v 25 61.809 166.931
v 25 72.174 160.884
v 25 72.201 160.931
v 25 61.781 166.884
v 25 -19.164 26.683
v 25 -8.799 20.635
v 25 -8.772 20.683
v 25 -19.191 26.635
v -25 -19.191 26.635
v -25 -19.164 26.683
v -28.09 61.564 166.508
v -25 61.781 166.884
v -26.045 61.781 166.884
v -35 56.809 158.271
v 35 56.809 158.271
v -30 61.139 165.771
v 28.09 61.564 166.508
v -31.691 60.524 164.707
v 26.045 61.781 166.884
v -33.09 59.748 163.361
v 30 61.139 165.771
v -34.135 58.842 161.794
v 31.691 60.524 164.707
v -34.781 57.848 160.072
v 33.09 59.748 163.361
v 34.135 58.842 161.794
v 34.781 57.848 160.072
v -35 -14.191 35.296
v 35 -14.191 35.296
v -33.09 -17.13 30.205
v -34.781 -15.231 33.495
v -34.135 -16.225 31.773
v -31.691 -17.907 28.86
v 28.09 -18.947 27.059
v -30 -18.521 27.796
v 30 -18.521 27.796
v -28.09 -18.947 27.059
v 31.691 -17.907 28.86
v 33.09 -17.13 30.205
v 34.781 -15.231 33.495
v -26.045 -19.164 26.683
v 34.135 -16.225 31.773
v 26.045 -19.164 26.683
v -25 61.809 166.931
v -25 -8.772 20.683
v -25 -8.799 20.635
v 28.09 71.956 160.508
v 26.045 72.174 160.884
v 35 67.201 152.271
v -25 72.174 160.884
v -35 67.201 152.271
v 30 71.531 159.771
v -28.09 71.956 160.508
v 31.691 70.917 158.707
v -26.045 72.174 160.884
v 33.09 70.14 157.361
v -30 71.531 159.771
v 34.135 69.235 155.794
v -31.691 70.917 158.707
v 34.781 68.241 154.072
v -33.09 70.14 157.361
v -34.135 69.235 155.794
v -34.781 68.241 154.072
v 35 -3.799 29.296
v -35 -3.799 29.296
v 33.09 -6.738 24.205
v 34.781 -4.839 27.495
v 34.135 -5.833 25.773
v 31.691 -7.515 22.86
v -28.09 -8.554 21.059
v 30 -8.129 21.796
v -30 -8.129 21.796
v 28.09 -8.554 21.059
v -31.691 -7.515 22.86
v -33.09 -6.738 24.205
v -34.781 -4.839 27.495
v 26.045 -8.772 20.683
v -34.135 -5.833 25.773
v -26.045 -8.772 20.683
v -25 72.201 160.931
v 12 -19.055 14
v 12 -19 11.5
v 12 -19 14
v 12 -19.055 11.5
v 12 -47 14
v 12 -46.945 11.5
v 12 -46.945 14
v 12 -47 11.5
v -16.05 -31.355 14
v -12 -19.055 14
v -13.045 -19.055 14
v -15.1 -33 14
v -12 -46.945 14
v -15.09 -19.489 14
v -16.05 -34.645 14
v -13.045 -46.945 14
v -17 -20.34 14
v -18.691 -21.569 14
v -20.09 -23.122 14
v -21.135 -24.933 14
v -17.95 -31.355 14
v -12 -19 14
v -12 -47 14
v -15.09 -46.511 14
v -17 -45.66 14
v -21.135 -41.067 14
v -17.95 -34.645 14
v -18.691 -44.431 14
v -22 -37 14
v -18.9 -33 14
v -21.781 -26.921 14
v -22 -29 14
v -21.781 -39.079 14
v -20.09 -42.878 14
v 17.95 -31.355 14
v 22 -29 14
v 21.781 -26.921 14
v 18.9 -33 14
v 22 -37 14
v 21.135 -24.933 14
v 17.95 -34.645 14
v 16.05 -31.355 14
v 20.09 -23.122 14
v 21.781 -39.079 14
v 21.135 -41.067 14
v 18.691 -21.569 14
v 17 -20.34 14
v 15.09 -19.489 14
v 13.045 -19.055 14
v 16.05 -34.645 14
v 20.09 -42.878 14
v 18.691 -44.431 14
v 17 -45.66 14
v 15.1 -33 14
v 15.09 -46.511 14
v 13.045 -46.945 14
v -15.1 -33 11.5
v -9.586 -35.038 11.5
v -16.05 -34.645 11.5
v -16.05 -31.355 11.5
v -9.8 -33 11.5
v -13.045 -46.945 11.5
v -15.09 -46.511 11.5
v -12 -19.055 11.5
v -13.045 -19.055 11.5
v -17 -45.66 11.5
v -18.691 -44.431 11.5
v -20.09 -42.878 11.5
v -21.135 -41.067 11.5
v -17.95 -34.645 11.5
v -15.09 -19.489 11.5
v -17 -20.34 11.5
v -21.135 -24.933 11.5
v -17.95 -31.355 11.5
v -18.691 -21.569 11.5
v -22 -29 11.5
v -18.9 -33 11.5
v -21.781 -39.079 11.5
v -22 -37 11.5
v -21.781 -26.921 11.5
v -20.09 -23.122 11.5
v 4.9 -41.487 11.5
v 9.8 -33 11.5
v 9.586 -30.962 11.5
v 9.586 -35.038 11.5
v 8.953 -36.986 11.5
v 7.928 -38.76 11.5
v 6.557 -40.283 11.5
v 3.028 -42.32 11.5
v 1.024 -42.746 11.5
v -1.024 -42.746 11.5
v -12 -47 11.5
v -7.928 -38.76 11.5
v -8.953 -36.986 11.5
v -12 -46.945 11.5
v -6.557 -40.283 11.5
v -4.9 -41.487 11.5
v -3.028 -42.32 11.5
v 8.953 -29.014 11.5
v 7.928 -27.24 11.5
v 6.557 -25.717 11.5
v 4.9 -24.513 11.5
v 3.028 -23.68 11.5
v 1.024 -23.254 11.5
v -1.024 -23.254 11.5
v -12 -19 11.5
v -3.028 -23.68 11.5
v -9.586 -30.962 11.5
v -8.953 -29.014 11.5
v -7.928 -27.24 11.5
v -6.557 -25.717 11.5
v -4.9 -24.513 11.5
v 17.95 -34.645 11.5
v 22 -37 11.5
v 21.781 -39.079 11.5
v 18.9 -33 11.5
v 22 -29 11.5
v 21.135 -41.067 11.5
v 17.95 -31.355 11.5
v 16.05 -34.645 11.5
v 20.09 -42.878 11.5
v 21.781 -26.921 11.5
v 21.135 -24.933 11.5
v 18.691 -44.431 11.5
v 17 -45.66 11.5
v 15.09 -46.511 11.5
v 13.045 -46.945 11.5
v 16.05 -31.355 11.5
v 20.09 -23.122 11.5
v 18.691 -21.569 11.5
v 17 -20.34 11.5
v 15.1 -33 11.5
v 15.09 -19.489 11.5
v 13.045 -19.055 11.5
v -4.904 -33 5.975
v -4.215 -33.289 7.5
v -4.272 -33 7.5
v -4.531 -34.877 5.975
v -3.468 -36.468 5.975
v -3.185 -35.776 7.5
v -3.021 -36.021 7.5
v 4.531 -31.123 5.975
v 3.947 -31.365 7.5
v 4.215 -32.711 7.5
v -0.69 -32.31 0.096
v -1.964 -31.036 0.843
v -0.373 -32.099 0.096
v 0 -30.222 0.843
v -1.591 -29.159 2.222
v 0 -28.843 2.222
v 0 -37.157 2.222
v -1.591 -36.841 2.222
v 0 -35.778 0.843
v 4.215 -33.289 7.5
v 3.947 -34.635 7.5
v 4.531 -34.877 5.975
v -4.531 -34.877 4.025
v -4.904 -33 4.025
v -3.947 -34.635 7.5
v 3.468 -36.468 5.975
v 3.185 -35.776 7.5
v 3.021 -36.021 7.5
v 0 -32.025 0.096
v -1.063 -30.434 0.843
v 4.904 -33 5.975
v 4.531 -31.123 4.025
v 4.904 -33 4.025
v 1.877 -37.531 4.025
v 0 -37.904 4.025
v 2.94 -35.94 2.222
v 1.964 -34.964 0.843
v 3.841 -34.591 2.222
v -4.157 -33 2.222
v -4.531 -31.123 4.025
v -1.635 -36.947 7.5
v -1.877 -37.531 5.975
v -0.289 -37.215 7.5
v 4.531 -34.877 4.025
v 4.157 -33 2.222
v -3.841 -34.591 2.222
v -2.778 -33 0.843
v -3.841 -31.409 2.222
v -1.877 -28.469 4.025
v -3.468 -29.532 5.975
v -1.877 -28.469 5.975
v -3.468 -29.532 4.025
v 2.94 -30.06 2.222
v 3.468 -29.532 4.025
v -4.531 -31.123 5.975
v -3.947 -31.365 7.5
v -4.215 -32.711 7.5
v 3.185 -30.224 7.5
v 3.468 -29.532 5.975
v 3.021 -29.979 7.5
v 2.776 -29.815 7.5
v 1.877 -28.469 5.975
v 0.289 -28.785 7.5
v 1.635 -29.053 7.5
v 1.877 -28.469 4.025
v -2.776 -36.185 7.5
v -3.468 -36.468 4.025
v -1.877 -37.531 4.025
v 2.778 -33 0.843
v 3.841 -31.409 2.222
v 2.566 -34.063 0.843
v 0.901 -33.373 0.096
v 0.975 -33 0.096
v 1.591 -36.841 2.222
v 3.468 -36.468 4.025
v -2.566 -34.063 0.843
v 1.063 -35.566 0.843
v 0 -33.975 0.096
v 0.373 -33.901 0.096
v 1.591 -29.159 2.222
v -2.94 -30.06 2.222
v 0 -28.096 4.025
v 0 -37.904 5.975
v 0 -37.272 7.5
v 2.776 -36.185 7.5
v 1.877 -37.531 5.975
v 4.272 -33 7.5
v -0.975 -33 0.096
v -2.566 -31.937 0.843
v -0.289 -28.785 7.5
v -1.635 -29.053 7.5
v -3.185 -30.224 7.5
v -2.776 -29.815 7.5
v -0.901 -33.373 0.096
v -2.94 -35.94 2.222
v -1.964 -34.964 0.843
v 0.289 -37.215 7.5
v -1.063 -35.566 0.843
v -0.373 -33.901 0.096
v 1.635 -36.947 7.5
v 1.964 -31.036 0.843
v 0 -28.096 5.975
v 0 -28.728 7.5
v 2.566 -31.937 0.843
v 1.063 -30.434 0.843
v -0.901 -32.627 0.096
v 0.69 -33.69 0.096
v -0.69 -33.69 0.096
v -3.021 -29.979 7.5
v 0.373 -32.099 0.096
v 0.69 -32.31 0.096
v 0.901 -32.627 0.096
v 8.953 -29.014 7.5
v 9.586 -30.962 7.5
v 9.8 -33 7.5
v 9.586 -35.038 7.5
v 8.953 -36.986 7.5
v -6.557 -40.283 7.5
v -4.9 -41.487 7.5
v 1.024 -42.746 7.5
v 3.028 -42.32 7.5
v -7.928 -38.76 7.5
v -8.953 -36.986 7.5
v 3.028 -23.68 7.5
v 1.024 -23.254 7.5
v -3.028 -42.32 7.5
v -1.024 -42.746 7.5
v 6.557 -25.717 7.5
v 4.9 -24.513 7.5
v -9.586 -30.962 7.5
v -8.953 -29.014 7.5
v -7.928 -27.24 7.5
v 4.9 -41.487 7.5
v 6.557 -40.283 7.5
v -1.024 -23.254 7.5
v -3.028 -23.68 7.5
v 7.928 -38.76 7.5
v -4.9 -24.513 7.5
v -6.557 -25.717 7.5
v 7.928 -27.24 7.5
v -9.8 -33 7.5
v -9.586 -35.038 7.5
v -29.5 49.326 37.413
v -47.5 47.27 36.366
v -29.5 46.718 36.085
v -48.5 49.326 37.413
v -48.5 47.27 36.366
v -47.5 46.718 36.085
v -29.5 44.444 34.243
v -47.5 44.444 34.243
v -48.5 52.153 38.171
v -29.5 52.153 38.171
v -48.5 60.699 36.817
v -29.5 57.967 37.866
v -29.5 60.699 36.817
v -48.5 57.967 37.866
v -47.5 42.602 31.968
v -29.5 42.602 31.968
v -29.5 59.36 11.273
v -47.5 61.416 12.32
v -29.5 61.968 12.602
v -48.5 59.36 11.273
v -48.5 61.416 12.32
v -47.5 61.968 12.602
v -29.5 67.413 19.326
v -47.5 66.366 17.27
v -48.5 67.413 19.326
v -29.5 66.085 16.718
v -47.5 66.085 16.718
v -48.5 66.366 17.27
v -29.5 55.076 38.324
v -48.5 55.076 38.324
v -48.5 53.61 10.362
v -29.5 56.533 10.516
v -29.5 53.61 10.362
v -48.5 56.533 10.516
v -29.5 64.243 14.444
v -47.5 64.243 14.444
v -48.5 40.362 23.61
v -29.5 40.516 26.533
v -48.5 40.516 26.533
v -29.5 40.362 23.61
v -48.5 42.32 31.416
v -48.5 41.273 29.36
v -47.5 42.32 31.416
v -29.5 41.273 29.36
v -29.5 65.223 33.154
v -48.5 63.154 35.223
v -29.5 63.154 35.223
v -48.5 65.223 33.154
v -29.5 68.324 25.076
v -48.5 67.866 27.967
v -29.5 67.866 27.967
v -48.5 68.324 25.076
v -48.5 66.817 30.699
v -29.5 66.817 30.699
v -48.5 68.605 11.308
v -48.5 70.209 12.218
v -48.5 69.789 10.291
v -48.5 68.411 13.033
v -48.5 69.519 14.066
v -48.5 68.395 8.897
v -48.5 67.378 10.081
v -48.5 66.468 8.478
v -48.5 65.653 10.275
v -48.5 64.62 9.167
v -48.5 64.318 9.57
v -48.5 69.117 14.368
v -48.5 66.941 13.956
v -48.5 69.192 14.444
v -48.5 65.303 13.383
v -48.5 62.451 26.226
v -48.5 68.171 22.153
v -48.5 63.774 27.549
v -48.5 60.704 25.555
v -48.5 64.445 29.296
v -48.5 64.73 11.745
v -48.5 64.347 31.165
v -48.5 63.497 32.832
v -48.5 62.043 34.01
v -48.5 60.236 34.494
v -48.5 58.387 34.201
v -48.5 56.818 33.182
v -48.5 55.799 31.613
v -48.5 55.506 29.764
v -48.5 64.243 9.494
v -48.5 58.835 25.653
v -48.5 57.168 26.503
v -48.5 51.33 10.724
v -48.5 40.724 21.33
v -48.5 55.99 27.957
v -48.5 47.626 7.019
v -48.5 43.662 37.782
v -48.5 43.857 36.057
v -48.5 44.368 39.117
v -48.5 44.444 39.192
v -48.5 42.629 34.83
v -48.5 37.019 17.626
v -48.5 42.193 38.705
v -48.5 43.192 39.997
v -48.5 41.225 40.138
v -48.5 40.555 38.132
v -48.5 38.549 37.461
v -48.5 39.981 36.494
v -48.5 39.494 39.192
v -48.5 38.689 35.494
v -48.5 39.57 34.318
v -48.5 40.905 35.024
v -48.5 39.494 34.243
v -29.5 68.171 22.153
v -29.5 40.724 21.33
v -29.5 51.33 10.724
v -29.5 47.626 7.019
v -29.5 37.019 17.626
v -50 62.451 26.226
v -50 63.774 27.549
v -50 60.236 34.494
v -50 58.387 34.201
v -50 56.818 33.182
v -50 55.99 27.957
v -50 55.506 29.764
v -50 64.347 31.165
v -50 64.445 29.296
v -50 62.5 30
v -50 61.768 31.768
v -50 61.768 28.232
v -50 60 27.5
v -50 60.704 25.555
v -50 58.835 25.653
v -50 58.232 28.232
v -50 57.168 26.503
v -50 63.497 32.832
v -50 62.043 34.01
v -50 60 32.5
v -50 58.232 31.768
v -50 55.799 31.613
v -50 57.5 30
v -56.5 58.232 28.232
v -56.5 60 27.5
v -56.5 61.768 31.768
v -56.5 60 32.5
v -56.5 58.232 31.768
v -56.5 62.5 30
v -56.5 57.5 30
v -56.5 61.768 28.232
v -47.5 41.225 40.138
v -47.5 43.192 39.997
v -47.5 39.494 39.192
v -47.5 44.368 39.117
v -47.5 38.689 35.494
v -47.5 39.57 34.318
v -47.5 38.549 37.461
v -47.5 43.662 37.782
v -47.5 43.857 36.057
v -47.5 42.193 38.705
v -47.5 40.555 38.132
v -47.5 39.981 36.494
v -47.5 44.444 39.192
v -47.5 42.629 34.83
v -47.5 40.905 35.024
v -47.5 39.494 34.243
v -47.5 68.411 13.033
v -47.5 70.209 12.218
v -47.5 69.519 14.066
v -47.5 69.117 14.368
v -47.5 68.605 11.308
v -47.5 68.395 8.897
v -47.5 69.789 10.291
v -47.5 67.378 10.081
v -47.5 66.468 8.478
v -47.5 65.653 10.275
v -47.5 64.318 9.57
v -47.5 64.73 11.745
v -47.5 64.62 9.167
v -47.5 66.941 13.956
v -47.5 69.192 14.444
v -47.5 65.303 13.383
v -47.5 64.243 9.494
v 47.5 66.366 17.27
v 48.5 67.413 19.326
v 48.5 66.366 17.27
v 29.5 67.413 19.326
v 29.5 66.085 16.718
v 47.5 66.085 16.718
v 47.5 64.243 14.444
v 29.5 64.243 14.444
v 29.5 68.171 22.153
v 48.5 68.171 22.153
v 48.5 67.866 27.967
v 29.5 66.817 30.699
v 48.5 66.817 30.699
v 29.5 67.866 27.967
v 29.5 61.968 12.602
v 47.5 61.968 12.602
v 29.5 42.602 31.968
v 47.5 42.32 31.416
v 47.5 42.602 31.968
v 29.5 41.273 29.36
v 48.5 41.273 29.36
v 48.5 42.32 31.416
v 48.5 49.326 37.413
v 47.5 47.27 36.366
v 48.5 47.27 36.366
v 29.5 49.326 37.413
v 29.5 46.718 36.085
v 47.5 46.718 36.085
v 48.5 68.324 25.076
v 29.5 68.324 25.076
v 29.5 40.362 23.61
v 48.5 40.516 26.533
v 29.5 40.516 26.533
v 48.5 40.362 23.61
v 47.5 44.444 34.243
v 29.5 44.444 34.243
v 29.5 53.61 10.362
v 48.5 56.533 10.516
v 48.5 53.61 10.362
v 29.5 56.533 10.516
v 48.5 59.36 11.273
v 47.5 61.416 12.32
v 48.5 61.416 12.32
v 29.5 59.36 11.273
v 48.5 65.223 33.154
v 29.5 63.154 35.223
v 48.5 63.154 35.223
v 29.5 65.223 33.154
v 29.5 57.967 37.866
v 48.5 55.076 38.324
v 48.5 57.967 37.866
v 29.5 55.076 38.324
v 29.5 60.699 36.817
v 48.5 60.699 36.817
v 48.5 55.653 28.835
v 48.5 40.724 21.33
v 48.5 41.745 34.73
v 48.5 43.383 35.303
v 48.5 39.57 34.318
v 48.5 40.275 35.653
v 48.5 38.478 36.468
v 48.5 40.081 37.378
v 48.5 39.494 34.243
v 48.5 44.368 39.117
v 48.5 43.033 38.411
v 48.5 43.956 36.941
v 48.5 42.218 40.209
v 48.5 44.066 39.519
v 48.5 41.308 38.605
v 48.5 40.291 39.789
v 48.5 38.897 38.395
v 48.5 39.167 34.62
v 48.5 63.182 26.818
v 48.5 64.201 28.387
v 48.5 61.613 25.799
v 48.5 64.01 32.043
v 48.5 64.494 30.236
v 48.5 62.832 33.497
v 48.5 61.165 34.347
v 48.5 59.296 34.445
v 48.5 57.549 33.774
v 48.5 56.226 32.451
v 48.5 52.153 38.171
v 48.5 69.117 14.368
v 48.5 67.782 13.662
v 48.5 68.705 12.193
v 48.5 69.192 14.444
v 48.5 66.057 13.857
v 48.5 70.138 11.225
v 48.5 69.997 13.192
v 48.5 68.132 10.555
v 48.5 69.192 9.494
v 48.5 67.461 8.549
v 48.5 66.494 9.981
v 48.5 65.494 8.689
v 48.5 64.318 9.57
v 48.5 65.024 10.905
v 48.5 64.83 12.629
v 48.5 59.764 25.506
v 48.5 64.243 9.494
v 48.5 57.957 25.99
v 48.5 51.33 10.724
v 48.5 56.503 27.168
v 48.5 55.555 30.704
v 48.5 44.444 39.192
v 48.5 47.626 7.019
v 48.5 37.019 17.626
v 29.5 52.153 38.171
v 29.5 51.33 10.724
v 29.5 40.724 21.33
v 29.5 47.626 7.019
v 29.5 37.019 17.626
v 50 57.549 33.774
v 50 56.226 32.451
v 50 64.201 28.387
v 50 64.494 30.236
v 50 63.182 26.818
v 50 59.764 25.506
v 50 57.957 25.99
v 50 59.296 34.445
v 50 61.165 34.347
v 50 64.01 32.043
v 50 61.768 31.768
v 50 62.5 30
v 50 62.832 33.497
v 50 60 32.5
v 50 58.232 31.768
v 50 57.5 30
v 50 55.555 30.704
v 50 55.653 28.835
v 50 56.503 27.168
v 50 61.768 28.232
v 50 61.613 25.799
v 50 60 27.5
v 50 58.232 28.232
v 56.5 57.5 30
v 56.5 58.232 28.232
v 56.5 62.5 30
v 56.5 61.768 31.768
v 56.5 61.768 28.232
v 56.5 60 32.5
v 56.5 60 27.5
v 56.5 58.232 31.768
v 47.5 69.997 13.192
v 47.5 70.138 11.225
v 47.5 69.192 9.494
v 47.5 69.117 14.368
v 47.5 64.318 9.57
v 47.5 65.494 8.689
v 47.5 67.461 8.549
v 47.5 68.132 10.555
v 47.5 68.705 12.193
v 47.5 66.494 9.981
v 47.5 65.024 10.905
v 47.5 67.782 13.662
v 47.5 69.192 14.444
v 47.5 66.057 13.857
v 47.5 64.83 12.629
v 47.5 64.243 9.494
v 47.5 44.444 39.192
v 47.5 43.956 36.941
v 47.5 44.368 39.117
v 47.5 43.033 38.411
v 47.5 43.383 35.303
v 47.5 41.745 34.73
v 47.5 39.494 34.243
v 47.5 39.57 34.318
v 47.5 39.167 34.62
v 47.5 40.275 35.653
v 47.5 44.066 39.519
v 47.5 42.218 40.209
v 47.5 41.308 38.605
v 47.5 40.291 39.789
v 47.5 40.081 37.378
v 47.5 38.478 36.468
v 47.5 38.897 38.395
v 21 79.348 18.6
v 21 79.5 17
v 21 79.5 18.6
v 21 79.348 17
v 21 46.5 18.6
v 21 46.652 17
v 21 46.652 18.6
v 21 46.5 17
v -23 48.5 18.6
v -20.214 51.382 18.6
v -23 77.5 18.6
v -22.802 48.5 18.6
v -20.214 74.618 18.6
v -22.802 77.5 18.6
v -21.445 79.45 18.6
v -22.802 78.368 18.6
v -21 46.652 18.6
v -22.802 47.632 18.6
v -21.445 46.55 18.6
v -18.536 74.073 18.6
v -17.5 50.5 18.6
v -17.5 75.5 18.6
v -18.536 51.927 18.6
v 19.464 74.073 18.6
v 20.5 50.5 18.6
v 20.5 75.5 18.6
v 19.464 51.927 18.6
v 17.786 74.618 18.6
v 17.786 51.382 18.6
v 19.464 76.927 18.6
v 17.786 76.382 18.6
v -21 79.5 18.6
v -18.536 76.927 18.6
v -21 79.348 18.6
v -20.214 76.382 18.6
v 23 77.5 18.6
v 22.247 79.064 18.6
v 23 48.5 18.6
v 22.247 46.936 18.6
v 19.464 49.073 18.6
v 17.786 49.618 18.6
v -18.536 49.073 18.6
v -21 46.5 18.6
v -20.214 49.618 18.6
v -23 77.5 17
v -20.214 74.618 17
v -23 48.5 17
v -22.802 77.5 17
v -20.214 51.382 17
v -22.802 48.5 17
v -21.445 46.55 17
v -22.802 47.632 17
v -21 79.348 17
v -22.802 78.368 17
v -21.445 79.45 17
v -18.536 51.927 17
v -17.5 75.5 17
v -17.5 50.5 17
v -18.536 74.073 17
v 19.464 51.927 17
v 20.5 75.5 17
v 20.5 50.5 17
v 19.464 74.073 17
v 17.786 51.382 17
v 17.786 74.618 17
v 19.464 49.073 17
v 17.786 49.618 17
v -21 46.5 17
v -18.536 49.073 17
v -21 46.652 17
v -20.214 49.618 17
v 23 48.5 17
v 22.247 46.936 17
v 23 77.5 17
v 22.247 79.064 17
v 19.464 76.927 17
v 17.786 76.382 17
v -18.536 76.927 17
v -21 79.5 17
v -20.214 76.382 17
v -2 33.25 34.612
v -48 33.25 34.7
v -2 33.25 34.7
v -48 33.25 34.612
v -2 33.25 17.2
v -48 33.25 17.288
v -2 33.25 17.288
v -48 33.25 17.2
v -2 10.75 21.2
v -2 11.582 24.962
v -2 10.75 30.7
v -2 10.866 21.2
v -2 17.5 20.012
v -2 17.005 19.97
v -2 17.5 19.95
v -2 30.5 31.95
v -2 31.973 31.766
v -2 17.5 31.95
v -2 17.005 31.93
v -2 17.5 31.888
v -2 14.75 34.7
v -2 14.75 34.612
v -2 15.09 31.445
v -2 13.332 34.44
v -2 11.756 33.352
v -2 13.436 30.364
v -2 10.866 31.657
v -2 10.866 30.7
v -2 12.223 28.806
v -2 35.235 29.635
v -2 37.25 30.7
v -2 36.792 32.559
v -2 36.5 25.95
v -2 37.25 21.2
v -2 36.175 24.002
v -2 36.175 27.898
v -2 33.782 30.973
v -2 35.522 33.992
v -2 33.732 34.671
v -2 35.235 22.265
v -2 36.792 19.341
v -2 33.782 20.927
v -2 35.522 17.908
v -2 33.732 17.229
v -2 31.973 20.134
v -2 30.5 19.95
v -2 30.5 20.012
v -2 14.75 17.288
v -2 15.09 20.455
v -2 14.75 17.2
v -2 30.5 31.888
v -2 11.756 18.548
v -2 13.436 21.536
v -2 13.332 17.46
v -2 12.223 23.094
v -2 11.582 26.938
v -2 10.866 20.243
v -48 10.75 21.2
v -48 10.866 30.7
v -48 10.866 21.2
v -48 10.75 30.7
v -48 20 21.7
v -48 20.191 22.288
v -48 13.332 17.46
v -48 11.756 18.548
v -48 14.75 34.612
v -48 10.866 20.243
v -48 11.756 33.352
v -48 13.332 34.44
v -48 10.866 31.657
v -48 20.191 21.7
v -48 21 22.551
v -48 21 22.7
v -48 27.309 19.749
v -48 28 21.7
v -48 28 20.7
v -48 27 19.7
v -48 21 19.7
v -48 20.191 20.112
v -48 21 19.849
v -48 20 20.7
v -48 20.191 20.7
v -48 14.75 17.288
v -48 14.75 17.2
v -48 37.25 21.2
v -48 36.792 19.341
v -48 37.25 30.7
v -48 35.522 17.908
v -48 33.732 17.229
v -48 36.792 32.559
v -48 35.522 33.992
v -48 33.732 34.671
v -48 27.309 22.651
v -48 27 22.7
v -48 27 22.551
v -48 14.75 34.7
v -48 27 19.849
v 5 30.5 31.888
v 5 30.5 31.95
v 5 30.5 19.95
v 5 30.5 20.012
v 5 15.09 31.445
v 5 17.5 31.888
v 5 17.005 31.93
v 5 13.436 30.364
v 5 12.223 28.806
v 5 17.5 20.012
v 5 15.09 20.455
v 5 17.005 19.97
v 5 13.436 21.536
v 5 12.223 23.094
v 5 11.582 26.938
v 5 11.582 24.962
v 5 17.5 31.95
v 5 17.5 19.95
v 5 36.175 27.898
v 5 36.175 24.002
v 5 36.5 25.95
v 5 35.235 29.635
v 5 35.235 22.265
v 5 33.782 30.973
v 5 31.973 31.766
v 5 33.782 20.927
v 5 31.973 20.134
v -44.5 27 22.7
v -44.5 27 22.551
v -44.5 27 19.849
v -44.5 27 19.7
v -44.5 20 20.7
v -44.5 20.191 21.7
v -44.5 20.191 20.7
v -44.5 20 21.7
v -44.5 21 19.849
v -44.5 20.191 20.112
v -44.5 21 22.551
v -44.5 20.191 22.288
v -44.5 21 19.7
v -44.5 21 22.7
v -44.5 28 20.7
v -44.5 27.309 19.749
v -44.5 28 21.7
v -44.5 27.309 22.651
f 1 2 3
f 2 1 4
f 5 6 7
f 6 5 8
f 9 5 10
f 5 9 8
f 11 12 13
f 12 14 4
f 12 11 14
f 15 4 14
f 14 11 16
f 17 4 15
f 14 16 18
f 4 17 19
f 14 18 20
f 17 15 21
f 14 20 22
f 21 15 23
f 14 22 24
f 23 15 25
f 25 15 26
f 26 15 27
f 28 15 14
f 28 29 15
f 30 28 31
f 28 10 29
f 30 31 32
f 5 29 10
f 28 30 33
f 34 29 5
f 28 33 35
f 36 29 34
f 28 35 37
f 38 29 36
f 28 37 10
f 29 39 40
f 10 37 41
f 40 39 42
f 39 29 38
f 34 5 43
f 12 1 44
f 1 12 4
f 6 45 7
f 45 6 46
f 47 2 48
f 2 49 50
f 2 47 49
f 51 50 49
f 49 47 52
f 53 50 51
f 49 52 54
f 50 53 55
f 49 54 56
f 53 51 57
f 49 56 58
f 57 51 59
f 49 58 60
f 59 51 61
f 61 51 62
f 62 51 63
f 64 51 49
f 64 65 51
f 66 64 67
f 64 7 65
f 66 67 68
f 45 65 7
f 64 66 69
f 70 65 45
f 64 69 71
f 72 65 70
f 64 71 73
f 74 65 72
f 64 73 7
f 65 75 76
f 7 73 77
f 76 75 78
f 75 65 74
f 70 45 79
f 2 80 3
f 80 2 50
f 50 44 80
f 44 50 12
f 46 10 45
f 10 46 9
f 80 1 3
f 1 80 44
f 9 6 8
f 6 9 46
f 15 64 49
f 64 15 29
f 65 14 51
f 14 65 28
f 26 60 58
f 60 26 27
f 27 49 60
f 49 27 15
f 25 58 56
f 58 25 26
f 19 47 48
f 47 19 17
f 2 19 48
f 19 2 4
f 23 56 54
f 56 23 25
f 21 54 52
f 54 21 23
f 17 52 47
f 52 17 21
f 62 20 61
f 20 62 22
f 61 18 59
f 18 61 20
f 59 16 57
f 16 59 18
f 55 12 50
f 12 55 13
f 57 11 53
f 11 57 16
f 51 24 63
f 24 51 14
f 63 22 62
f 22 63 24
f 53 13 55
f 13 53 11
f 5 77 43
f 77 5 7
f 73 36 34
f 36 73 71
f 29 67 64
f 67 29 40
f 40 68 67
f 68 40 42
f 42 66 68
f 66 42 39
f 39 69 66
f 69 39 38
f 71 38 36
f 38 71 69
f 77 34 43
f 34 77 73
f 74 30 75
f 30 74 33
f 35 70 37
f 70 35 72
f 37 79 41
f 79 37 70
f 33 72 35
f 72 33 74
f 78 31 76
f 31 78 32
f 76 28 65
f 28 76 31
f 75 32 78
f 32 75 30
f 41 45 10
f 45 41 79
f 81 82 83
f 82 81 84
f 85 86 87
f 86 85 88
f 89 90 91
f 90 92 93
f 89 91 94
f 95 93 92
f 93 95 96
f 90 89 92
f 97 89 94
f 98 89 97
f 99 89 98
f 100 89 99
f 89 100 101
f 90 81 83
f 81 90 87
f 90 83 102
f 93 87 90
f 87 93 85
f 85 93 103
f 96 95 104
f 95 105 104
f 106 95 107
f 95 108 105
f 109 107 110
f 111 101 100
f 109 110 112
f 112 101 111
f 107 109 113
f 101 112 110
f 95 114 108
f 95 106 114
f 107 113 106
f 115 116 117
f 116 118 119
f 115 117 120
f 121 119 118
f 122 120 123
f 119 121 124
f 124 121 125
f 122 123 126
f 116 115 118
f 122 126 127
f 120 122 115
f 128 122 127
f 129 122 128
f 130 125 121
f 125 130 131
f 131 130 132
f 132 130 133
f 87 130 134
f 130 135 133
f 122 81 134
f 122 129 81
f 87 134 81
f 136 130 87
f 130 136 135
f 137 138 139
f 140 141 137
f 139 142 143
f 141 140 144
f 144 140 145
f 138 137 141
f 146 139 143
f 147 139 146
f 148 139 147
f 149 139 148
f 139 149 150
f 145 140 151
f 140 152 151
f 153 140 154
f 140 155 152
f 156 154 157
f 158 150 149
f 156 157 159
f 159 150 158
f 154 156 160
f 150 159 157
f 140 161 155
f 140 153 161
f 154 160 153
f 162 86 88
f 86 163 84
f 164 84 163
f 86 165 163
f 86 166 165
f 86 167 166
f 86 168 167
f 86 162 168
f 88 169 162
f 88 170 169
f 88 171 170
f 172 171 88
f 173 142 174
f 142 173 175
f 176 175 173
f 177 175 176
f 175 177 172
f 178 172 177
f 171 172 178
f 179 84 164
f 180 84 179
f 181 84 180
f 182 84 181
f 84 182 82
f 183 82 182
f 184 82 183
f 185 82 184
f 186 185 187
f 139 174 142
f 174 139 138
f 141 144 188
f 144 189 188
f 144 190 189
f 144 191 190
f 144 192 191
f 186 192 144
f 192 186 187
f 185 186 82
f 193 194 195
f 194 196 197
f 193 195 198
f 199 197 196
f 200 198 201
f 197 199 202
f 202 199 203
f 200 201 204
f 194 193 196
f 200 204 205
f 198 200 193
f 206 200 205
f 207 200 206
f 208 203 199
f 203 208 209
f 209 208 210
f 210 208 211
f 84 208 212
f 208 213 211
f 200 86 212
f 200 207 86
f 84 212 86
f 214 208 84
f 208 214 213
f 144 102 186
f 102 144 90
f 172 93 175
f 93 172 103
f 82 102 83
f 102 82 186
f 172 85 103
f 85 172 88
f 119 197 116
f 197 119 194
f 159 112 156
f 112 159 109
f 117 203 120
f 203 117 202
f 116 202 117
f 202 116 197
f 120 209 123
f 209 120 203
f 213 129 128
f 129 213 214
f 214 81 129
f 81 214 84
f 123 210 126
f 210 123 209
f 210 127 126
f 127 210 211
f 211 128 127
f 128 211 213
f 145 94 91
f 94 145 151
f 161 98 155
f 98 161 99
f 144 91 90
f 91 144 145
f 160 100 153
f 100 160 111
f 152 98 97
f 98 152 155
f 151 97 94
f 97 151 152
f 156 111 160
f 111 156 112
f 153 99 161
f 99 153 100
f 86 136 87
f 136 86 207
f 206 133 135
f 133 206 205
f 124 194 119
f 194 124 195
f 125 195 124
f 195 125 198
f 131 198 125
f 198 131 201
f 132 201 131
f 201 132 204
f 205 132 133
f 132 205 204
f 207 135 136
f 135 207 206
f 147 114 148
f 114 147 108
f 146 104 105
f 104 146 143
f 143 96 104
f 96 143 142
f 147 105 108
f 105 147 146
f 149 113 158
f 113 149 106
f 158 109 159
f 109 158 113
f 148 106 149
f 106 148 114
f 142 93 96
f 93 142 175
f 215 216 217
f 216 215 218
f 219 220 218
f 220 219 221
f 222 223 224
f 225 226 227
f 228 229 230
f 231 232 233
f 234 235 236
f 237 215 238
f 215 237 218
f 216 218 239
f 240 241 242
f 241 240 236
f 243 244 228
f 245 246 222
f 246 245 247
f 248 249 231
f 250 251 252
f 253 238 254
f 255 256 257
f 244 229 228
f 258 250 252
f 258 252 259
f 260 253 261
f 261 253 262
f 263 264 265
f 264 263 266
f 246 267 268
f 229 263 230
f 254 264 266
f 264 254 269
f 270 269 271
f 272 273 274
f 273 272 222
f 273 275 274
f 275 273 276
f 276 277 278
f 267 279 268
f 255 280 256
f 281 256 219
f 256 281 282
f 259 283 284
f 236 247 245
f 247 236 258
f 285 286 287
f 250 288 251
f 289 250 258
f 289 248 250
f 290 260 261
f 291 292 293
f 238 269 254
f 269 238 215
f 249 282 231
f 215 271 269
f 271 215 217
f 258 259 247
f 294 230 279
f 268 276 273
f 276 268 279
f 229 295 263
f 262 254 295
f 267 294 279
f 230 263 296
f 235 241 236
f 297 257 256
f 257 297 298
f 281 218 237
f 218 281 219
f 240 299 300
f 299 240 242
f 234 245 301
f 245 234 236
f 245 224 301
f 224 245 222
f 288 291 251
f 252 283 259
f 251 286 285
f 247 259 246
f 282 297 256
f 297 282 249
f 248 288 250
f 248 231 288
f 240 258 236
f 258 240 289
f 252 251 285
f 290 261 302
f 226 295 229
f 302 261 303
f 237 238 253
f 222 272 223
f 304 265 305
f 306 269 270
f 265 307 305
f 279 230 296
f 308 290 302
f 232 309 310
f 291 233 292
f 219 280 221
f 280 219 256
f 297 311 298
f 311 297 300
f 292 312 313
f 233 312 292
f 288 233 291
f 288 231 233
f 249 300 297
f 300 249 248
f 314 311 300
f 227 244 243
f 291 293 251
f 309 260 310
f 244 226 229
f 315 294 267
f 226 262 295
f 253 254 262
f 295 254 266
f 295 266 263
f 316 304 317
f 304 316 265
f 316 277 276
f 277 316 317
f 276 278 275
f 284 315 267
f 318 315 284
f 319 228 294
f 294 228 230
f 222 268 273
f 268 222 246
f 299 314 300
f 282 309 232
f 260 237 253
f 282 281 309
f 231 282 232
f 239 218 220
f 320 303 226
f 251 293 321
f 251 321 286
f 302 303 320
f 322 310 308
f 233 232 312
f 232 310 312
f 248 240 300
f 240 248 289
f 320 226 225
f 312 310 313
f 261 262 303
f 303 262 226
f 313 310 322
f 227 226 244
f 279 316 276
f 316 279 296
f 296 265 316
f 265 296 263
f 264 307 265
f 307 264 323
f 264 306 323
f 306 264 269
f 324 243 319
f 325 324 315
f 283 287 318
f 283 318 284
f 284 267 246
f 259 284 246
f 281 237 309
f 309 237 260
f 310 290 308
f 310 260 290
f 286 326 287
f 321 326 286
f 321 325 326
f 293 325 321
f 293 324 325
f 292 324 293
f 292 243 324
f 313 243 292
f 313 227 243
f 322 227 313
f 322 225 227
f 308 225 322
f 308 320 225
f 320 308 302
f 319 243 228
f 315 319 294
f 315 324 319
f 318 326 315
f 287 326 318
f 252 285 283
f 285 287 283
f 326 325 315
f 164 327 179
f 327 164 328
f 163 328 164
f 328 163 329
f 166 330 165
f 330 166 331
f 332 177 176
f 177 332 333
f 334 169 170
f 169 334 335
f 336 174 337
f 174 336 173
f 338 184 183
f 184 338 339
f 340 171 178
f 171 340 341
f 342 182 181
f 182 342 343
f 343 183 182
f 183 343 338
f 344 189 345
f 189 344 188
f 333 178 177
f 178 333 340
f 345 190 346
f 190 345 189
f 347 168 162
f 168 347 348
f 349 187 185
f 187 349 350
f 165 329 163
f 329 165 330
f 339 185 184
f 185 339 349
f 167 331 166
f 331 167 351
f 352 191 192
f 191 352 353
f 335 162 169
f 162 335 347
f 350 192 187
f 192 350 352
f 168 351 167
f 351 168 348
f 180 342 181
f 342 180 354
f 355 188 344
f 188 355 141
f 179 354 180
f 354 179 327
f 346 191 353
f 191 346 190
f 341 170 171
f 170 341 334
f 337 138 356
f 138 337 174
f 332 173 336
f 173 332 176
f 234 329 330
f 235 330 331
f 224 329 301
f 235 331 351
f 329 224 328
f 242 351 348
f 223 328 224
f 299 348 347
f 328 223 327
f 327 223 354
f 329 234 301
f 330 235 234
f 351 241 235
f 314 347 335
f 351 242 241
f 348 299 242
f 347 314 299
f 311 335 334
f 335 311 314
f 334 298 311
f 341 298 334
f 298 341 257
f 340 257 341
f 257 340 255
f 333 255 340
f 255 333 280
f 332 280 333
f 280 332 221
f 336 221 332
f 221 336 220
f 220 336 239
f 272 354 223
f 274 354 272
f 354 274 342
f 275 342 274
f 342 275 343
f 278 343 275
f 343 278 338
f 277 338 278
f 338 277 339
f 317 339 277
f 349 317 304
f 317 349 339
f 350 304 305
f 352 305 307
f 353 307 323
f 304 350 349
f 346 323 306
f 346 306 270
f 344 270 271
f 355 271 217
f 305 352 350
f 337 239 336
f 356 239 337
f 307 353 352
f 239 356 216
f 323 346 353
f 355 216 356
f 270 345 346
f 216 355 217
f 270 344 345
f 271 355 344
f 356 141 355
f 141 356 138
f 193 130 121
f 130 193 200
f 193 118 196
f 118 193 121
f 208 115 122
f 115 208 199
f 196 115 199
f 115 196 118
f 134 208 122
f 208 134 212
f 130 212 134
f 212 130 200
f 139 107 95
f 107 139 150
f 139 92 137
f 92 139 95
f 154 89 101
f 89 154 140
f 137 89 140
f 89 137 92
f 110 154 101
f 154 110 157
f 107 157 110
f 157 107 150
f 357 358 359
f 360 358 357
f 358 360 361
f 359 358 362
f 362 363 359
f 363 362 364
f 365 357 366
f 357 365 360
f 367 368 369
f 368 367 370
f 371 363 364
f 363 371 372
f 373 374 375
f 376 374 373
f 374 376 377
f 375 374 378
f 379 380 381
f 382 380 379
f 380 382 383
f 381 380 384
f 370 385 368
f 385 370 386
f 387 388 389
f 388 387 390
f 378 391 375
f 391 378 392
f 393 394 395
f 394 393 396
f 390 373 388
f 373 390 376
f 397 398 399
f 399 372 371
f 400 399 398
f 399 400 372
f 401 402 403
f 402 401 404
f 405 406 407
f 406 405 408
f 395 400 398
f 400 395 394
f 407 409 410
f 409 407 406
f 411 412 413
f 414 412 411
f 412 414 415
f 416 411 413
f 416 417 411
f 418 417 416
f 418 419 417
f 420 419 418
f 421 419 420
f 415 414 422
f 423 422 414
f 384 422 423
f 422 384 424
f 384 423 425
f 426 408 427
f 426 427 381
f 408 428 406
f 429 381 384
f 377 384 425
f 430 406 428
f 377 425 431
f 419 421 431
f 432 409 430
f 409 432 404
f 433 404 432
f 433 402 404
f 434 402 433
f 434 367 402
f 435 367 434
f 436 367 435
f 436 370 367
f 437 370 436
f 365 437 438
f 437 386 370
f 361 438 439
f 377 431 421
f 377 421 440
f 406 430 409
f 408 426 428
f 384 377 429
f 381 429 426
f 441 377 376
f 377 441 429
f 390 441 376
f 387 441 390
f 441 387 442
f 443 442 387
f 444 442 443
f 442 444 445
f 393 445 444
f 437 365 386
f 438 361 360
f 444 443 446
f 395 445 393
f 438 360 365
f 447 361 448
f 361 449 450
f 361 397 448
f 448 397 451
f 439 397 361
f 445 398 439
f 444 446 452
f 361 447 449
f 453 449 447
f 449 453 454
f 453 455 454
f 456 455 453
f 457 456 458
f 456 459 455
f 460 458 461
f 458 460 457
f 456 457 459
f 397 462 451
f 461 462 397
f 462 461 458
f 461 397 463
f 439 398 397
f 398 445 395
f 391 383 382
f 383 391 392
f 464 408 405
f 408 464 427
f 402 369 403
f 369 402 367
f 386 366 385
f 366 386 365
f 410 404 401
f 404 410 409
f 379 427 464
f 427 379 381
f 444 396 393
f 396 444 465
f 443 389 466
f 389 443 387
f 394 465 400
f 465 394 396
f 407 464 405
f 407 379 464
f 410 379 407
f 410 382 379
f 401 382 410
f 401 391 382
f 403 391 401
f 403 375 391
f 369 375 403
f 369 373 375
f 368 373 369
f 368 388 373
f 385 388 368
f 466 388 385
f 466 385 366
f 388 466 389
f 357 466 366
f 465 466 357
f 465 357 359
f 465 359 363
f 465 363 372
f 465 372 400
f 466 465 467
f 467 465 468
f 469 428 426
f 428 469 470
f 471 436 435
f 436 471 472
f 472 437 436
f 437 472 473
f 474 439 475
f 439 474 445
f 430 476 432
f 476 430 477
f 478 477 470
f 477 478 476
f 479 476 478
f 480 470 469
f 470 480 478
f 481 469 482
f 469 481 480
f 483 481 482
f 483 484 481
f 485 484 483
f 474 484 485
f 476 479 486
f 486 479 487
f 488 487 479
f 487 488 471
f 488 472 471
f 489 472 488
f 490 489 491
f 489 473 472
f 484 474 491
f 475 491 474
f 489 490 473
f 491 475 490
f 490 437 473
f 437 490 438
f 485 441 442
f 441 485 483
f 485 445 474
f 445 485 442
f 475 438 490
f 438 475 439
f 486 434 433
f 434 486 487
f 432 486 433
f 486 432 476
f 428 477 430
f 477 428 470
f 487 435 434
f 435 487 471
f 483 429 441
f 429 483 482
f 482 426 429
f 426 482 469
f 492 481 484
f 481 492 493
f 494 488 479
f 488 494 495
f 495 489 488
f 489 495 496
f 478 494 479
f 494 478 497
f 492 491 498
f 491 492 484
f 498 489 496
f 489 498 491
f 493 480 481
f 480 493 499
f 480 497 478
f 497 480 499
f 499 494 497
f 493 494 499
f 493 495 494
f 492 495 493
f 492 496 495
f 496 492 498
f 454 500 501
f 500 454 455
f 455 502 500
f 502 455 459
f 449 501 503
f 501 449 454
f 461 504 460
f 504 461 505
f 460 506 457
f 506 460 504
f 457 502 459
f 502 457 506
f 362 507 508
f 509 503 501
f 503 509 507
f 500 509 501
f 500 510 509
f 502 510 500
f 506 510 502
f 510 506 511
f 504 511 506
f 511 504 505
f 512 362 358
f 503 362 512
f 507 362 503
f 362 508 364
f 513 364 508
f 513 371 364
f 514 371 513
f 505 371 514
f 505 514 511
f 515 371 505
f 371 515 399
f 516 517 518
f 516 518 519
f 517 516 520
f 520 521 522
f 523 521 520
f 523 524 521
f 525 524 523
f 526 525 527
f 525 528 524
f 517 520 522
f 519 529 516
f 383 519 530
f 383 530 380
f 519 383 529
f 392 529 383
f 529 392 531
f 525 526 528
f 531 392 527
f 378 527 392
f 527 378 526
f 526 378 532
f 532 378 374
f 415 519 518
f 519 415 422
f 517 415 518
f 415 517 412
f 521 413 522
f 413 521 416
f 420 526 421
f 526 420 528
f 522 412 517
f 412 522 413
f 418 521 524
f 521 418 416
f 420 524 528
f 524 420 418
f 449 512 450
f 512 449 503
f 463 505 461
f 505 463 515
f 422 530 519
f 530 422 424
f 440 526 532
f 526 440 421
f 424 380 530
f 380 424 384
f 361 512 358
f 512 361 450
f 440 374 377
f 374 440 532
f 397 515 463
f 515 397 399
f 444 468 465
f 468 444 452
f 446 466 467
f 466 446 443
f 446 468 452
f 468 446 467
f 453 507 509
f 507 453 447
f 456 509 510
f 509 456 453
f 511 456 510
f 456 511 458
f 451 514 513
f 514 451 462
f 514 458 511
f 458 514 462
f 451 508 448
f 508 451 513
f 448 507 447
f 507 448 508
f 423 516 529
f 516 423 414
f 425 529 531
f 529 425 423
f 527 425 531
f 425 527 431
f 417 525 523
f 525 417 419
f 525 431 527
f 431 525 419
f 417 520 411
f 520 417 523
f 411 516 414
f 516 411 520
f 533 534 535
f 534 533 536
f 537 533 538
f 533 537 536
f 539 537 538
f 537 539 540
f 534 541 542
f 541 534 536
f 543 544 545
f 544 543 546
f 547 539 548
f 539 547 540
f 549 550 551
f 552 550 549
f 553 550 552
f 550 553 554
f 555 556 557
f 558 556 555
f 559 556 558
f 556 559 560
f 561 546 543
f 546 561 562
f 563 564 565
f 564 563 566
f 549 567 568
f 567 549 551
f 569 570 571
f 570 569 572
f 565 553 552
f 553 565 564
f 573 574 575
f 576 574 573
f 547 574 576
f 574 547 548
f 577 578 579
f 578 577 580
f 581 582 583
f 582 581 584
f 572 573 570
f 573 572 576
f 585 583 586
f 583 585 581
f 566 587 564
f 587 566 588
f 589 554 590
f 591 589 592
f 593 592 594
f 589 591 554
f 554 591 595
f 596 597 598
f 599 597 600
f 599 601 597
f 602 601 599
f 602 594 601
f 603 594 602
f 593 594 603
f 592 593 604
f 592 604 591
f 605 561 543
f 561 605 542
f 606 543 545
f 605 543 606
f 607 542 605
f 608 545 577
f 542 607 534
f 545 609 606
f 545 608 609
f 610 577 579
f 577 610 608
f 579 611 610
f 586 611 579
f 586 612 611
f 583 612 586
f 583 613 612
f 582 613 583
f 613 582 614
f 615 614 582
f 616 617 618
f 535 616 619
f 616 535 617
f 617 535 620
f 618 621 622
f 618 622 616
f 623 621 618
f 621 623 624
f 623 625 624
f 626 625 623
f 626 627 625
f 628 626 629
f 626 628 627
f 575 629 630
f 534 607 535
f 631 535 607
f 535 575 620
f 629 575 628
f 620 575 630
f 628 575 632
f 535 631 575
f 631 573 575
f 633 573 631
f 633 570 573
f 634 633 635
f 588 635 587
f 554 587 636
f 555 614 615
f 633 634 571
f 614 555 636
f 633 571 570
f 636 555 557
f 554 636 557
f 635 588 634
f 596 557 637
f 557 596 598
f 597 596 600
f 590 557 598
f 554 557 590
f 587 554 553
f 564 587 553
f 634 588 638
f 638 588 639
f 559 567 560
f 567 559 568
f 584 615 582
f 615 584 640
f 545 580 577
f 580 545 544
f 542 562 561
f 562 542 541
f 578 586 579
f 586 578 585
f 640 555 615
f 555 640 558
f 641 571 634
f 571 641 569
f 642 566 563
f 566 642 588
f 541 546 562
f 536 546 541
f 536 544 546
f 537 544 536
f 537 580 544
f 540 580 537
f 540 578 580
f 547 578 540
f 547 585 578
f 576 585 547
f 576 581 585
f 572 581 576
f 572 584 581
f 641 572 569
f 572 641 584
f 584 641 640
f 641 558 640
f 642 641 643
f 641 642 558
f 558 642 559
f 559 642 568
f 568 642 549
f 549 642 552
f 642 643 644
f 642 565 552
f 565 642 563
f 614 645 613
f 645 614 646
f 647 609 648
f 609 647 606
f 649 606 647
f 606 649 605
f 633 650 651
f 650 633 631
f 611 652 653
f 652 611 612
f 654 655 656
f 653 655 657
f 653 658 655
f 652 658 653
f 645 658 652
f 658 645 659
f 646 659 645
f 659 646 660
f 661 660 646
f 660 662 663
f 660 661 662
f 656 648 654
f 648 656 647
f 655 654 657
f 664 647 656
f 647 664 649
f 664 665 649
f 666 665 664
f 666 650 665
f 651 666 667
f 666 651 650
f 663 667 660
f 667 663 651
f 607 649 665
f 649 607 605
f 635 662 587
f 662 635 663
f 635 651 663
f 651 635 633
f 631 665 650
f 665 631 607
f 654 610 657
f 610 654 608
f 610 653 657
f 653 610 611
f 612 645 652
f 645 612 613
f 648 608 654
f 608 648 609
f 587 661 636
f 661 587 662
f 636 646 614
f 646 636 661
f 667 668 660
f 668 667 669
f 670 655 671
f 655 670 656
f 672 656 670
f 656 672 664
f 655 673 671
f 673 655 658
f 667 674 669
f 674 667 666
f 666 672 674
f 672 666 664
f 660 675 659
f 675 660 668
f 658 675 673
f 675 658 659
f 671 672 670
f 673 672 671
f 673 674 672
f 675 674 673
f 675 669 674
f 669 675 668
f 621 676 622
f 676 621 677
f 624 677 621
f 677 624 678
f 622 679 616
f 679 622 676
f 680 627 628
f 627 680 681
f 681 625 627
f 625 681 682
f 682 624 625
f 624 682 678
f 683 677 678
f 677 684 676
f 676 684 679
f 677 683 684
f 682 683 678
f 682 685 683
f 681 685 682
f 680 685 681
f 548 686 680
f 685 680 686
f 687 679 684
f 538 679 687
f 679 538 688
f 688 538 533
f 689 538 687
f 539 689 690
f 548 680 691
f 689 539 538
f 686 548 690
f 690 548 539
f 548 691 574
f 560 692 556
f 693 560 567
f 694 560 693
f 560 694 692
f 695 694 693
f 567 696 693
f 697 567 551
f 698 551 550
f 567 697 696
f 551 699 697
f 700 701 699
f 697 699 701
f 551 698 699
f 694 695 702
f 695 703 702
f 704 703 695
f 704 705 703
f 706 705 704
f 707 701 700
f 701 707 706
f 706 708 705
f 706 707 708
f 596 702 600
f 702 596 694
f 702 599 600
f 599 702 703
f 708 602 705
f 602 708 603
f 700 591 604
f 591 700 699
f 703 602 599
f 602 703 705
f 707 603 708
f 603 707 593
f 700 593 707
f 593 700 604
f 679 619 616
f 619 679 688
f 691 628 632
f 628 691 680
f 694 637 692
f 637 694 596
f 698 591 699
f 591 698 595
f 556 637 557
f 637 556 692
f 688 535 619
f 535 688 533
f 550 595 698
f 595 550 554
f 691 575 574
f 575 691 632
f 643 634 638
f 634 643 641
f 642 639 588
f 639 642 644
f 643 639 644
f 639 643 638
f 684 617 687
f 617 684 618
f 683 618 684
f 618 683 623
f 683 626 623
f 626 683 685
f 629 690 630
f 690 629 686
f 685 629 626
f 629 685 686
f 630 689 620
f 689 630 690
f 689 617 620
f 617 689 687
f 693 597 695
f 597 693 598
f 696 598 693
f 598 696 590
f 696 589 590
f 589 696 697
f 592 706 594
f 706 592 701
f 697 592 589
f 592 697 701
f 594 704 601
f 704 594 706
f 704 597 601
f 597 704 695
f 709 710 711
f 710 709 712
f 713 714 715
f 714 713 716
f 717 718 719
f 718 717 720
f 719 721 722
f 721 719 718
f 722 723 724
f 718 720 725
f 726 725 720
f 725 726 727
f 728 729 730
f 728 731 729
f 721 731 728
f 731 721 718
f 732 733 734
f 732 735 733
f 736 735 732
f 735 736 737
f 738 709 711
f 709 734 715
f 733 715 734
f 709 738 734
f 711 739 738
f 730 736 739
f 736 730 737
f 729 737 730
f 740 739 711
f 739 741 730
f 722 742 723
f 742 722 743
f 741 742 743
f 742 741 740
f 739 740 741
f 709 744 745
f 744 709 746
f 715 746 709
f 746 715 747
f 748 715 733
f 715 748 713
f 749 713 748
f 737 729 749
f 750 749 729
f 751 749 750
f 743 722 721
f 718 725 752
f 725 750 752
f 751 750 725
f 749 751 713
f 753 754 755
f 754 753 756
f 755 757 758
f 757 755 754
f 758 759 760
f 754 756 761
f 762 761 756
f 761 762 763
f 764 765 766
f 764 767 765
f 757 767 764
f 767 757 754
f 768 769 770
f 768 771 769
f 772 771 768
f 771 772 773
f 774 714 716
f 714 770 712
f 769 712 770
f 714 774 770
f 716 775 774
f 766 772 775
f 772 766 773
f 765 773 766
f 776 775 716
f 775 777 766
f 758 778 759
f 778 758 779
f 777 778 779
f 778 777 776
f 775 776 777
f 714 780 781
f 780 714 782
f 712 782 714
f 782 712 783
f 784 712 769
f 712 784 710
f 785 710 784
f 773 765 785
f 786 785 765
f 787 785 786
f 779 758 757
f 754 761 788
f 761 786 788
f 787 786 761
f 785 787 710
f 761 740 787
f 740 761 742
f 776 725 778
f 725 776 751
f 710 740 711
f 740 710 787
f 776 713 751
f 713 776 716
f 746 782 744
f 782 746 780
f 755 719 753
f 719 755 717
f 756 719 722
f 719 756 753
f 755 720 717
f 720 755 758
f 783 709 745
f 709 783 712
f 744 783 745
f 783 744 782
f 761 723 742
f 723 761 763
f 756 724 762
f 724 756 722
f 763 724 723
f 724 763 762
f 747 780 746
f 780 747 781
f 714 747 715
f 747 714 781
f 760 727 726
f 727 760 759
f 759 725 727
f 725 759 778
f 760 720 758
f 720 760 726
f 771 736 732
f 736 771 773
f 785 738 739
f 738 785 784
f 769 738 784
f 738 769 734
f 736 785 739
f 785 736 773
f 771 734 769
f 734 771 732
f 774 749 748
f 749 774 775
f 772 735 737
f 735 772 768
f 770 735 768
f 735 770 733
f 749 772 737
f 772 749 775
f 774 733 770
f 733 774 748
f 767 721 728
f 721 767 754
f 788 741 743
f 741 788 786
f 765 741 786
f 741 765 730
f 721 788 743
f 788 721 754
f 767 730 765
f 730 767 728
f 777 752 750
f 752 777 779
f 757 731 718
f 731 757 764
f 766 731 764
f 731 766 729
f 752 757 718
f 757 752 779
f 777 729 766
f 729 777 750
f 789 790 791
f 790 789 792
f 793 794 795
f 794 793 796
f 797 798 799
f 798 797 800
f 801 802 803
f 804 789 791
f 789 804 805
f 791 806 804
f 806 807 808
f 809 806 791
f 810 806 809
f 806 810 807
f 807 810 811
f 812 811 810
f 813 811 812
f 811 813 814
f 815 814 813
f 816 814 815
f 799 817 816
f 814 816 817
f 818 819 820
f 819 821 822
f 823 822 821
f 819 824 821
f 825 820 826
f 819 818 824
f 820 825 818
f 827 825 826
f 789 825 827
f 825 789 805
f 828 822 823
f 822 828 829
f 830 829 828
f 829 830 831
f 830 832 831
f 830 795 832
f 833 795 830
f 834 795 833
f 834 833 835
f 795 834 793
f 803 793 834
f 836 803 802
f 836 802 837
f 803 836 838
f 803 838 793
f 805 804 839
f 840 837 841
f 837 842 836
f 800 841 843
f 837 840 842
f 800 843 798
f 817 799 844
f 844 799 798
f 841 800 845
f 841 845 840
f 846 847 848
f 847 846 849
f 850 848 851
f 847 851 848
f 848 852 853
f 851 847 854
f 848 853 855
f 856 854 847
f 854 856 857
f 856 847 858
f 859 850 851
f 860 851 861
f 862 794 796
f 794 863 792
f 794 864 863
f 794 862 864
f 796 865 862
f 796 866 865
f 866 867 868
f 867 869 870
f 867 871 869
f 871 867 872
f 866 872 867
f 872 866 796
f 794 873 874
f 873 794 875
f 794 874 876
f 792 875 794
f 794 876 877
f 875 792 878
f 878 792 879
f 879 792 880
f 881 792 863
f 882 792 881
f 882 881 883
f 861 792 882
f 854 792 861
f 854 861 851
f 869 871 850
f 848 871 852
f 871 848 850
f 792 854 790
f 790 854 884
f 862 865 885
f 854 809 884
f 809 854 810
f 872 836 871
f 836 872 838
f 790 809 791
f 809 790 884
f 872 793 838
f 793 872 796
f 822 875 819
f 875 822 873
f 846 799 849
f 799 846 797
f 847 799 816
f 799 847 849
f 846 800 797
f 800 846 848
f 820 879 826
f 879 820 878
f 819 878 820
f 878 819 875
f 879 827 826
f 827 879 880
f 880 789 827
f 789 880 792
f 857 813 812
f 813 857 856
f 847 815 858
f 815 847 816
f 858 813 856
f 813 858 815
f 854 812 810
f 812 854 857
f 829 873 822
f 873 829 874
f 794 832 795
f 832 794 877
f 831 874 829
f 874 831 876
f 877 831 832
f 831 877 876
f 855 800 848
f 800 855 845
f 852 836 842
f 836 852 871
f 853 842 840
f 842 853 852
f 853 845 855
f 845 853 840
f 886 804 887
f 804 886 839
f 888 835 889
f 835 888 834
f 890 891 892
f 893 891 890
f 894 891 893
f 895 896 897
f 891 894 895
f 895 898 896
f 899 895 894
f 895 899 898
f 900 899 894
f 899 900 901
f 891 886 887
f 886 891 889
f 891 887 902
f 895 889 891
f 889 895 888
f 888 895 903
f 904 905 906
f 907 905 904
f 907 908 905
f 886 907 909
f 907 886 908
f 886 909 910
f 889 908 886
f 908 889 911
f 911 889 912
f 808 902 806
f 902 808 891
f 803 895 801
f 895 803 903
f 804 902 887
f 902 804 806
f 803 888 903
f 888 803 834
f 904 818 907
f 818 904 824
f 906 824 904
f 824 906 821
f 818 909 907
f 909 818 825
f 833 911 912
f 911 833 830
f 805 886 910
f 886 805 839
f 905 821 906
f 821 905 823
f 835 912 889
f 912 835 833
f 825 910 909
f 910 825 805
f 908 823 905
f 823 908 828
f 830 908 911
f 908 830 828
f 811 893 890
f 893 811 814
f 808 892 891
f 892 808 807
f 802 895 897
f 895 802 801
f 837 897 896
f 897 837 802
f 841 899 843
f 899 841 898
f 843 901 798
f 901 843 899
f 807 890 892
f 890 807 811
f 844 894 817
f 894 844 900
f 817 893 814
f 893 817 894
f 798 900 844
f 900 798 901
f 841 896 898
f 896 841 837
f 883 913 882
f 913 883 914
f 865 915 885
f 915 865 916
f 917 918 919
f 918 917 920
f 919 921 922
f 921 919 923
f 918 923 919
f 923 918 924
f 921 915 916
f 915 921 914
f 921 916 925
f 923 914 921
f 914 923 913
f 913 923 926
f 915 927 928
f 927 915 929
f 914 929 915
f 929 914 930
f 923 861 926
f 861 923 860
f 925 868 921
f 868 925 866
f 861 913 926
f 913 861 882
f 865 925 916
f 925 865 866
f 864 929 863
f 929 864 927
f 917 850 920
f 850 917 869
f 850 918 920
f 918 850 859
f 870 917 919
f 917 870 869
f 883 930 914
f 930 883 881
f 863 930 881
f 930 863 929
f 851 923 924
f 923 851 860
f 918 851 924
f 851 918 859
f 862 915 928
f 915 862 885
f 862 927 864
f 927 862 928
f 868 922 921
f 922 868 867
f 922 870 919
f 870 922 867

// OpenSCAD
 BOTW=100; // bot width
 BOTWH=BOTW/2; // half bot width
 
 // centered rounded rect
 module roundedrect(x,y,r,t) {
   ix = x/2 - r;
   iy = y/2 - r;
   union() {
    translate([0,0,0]) cube([x-r*2,y,t], center=true);
    translate([0,0,0]) cube([x,y-r*2,t], center=true);
    translate([ix,iy,0]) cylinder(r=r,h=t, center=true);
    translate([-ix,iy,0]) cylinder(r=r,h=t, center=true);
    translate([ix,-iy,0]) cylinder(r=r,h=t, center=true);
    translate([-ix,-iy,0]) cylinder(r=r,h=t, center=true);
   }
 }
 
 module phone() { 
     offset = -35;
 color("#F80") linear_extrude(height=3,center=true) translate([-(BOTWH+1.5),offset]) import_dxf("bot_phoneholder.dxf");
     color("#8FF") translate([0,87+offset,6+1.5]) roundedrect(70,162,10,12); // phone! 80,162
     color("#F80") translate([-43,offset+4.5,11.5]) rotate([-90,0,0]) linear_extrude(height=3,center=true) import_dxf("bot_phonebase.dxf");
     color("#8FF") translate([-BOTWH,0,0]) rotate([0,90,0]) translate([-7.5,-7.5]) linear_extrude(height=3,center=true) import_dxf("bot_phone_axle.dxf");
     color("#8FF") translate([BOTWH,0,0]) rotate([0,90,0]) translate([-7.5,-7.5]) linear_extrude(height=3,center=true) import_dxf("bot_phone_axle.dxf");
 }
 
 module pcb() { 
     SX=38/2;SY=25/2;
     difference() {
       color("#8F8") translate([0,0,0.8]) roundedrect(46,33,2,1.6); 
       translate([SX,SY,0]) cylinder(r=1.5,h=5,center=true);
       translate([SX,-SY,0]) cylinder(r=1.5,h=5,center=true);
       translate([-SX,SY,0]) cylinder(r=1.5,h=5,center=true);
       translate([-SX,-SY,0]) cylinder(r=1.5,h=5,center=true);
     };
 } 
 
 module battery() { 
   difference() {
     union() {
     color("#F44") translate([0,0,17.5/2]) rotate([90,0,90])  roundedrect(26.5,17.5,4,46); 
     color("#822") translate([(46+7)/2,0,17.5/2]) rotate([90,0,90])  roundedrect(25,12,6,7); 
     }
     color("#000") translate([-46/2,0,4]) rotate([90,0,90])  roundedrect(8,3,1,7); 
   }
 } 
 
module castorholder() { 
 color("#F80") linear_extrude(height=3,center=true) translate([-(BOTWH+1),-15]) import_dxf("bot_castorholder.dxf");
 }
 
module topplate() { 
 color("#F80") linear_extrude(height=3,center=true) translate([-(BOTWH+1),-15]) import_dxf("bot_topplate.dxf");
 }
 
module baseplate() { 
 color("#F80") linear_extrude(height=3,center=true) rotate([0,0,180]) translate([-(BOTWH+1),-70]) import_dxf("bot_baseplate.dxf");
 }
 
module side() { 
 linear_extrude(height=3,center=true) translate([0,0]) import_dxf("bot_side.dxf");
}
 
module wheel() { 
 color("#FF0") linear_extrude(height=3,center=true) translate([-30,-30]) import_dxf("bot_wheel.dxf");
}

module castor() { // descends 14mm
  color("#FF8") difference() {
   union() {
    translate([0,0,-1.25]) roundedrect(44,28, 10, 2.5);
    translate([0,0,5-14]) sphere(r=5);
       translate([0,0,-4]) cylinder(r=19.6/2,h=5,center=true);
   }; union() {
    translate([34/2,0,0]) cylinder(r=3.8/2,h=5, center=true); // 3.8mm holes
    translate([-34/2,0,0]) cylinder(r=3.8/2, h=5, center=true);
   }
  }
}
 
module stepper() {
  color("#F00") translate([0,-8,-19]) difference() { union() {
    cylinder(r=28/2, h=19);
    translate([0,8,19]) cylinder(r=9/2, h=1.5);
    translate([0,8,19]) cylinder(r=5/2, h=8);   // shaft
    translate([35/2,0,18]) cylinder(r=7/2, h=1);
    translate([-35/2,0,18]) cylinder(r=7/2, h=1);
    translate([0,0,18.5]) cube([35,7,1],center=true);
    translate([0,-14,19/2]) cube([15,6,19],center=true);
  }; union() {
    translate([35/2,0,17]) cylinder(r=4/2, h=3);
    translate([-35/2,0,17]) cylinder(r=4/2, h=3);
  }
  }
}

translate([0,7,45]) rotate([60,0,0]) phone();
//translate([0,10,30]) cube([120,2,2],center=true); // pivot
 

translate([BOTWH,0,0]) rotate([90,0,90]) side();
translate([-BOTWH,0,0])  rotate([90,0,90]) side();
 

translate([0,-33,14])  castor();
translate([0,-33,14+1.5]) castorholder();
translate([0,30,35+1.5]) topplate();
translate([0,10,14+1.5]) baseplate();

WHEELX=60;
WHEELY=30;
translate([-BOTWH+1.5,WHEELX,WHEELY]) rotate([90,-45,-90])  stepper();
translate([BOTWH-1.5,WHEELX,WHEELY]) rotate([90,45,90])  stepper();
translate([0,WHEELX+3,14+3])  pcb();
translate([-25,WHEELX-36,14+3.2])  battery();
//translate([7,WHEELX-36,30])  cylinder(r=1.5,h=40,center=true); // screw to hold battery in

translate([BOTWH+4,WHEELX,WHEELY])  rotate([90,0,90]) wheel();
//translate([-(BOTWH+4),WHEELX,WHEELY])  rotate([90,0,90]) wheel();


//roundedrect(80,162,10,12);
